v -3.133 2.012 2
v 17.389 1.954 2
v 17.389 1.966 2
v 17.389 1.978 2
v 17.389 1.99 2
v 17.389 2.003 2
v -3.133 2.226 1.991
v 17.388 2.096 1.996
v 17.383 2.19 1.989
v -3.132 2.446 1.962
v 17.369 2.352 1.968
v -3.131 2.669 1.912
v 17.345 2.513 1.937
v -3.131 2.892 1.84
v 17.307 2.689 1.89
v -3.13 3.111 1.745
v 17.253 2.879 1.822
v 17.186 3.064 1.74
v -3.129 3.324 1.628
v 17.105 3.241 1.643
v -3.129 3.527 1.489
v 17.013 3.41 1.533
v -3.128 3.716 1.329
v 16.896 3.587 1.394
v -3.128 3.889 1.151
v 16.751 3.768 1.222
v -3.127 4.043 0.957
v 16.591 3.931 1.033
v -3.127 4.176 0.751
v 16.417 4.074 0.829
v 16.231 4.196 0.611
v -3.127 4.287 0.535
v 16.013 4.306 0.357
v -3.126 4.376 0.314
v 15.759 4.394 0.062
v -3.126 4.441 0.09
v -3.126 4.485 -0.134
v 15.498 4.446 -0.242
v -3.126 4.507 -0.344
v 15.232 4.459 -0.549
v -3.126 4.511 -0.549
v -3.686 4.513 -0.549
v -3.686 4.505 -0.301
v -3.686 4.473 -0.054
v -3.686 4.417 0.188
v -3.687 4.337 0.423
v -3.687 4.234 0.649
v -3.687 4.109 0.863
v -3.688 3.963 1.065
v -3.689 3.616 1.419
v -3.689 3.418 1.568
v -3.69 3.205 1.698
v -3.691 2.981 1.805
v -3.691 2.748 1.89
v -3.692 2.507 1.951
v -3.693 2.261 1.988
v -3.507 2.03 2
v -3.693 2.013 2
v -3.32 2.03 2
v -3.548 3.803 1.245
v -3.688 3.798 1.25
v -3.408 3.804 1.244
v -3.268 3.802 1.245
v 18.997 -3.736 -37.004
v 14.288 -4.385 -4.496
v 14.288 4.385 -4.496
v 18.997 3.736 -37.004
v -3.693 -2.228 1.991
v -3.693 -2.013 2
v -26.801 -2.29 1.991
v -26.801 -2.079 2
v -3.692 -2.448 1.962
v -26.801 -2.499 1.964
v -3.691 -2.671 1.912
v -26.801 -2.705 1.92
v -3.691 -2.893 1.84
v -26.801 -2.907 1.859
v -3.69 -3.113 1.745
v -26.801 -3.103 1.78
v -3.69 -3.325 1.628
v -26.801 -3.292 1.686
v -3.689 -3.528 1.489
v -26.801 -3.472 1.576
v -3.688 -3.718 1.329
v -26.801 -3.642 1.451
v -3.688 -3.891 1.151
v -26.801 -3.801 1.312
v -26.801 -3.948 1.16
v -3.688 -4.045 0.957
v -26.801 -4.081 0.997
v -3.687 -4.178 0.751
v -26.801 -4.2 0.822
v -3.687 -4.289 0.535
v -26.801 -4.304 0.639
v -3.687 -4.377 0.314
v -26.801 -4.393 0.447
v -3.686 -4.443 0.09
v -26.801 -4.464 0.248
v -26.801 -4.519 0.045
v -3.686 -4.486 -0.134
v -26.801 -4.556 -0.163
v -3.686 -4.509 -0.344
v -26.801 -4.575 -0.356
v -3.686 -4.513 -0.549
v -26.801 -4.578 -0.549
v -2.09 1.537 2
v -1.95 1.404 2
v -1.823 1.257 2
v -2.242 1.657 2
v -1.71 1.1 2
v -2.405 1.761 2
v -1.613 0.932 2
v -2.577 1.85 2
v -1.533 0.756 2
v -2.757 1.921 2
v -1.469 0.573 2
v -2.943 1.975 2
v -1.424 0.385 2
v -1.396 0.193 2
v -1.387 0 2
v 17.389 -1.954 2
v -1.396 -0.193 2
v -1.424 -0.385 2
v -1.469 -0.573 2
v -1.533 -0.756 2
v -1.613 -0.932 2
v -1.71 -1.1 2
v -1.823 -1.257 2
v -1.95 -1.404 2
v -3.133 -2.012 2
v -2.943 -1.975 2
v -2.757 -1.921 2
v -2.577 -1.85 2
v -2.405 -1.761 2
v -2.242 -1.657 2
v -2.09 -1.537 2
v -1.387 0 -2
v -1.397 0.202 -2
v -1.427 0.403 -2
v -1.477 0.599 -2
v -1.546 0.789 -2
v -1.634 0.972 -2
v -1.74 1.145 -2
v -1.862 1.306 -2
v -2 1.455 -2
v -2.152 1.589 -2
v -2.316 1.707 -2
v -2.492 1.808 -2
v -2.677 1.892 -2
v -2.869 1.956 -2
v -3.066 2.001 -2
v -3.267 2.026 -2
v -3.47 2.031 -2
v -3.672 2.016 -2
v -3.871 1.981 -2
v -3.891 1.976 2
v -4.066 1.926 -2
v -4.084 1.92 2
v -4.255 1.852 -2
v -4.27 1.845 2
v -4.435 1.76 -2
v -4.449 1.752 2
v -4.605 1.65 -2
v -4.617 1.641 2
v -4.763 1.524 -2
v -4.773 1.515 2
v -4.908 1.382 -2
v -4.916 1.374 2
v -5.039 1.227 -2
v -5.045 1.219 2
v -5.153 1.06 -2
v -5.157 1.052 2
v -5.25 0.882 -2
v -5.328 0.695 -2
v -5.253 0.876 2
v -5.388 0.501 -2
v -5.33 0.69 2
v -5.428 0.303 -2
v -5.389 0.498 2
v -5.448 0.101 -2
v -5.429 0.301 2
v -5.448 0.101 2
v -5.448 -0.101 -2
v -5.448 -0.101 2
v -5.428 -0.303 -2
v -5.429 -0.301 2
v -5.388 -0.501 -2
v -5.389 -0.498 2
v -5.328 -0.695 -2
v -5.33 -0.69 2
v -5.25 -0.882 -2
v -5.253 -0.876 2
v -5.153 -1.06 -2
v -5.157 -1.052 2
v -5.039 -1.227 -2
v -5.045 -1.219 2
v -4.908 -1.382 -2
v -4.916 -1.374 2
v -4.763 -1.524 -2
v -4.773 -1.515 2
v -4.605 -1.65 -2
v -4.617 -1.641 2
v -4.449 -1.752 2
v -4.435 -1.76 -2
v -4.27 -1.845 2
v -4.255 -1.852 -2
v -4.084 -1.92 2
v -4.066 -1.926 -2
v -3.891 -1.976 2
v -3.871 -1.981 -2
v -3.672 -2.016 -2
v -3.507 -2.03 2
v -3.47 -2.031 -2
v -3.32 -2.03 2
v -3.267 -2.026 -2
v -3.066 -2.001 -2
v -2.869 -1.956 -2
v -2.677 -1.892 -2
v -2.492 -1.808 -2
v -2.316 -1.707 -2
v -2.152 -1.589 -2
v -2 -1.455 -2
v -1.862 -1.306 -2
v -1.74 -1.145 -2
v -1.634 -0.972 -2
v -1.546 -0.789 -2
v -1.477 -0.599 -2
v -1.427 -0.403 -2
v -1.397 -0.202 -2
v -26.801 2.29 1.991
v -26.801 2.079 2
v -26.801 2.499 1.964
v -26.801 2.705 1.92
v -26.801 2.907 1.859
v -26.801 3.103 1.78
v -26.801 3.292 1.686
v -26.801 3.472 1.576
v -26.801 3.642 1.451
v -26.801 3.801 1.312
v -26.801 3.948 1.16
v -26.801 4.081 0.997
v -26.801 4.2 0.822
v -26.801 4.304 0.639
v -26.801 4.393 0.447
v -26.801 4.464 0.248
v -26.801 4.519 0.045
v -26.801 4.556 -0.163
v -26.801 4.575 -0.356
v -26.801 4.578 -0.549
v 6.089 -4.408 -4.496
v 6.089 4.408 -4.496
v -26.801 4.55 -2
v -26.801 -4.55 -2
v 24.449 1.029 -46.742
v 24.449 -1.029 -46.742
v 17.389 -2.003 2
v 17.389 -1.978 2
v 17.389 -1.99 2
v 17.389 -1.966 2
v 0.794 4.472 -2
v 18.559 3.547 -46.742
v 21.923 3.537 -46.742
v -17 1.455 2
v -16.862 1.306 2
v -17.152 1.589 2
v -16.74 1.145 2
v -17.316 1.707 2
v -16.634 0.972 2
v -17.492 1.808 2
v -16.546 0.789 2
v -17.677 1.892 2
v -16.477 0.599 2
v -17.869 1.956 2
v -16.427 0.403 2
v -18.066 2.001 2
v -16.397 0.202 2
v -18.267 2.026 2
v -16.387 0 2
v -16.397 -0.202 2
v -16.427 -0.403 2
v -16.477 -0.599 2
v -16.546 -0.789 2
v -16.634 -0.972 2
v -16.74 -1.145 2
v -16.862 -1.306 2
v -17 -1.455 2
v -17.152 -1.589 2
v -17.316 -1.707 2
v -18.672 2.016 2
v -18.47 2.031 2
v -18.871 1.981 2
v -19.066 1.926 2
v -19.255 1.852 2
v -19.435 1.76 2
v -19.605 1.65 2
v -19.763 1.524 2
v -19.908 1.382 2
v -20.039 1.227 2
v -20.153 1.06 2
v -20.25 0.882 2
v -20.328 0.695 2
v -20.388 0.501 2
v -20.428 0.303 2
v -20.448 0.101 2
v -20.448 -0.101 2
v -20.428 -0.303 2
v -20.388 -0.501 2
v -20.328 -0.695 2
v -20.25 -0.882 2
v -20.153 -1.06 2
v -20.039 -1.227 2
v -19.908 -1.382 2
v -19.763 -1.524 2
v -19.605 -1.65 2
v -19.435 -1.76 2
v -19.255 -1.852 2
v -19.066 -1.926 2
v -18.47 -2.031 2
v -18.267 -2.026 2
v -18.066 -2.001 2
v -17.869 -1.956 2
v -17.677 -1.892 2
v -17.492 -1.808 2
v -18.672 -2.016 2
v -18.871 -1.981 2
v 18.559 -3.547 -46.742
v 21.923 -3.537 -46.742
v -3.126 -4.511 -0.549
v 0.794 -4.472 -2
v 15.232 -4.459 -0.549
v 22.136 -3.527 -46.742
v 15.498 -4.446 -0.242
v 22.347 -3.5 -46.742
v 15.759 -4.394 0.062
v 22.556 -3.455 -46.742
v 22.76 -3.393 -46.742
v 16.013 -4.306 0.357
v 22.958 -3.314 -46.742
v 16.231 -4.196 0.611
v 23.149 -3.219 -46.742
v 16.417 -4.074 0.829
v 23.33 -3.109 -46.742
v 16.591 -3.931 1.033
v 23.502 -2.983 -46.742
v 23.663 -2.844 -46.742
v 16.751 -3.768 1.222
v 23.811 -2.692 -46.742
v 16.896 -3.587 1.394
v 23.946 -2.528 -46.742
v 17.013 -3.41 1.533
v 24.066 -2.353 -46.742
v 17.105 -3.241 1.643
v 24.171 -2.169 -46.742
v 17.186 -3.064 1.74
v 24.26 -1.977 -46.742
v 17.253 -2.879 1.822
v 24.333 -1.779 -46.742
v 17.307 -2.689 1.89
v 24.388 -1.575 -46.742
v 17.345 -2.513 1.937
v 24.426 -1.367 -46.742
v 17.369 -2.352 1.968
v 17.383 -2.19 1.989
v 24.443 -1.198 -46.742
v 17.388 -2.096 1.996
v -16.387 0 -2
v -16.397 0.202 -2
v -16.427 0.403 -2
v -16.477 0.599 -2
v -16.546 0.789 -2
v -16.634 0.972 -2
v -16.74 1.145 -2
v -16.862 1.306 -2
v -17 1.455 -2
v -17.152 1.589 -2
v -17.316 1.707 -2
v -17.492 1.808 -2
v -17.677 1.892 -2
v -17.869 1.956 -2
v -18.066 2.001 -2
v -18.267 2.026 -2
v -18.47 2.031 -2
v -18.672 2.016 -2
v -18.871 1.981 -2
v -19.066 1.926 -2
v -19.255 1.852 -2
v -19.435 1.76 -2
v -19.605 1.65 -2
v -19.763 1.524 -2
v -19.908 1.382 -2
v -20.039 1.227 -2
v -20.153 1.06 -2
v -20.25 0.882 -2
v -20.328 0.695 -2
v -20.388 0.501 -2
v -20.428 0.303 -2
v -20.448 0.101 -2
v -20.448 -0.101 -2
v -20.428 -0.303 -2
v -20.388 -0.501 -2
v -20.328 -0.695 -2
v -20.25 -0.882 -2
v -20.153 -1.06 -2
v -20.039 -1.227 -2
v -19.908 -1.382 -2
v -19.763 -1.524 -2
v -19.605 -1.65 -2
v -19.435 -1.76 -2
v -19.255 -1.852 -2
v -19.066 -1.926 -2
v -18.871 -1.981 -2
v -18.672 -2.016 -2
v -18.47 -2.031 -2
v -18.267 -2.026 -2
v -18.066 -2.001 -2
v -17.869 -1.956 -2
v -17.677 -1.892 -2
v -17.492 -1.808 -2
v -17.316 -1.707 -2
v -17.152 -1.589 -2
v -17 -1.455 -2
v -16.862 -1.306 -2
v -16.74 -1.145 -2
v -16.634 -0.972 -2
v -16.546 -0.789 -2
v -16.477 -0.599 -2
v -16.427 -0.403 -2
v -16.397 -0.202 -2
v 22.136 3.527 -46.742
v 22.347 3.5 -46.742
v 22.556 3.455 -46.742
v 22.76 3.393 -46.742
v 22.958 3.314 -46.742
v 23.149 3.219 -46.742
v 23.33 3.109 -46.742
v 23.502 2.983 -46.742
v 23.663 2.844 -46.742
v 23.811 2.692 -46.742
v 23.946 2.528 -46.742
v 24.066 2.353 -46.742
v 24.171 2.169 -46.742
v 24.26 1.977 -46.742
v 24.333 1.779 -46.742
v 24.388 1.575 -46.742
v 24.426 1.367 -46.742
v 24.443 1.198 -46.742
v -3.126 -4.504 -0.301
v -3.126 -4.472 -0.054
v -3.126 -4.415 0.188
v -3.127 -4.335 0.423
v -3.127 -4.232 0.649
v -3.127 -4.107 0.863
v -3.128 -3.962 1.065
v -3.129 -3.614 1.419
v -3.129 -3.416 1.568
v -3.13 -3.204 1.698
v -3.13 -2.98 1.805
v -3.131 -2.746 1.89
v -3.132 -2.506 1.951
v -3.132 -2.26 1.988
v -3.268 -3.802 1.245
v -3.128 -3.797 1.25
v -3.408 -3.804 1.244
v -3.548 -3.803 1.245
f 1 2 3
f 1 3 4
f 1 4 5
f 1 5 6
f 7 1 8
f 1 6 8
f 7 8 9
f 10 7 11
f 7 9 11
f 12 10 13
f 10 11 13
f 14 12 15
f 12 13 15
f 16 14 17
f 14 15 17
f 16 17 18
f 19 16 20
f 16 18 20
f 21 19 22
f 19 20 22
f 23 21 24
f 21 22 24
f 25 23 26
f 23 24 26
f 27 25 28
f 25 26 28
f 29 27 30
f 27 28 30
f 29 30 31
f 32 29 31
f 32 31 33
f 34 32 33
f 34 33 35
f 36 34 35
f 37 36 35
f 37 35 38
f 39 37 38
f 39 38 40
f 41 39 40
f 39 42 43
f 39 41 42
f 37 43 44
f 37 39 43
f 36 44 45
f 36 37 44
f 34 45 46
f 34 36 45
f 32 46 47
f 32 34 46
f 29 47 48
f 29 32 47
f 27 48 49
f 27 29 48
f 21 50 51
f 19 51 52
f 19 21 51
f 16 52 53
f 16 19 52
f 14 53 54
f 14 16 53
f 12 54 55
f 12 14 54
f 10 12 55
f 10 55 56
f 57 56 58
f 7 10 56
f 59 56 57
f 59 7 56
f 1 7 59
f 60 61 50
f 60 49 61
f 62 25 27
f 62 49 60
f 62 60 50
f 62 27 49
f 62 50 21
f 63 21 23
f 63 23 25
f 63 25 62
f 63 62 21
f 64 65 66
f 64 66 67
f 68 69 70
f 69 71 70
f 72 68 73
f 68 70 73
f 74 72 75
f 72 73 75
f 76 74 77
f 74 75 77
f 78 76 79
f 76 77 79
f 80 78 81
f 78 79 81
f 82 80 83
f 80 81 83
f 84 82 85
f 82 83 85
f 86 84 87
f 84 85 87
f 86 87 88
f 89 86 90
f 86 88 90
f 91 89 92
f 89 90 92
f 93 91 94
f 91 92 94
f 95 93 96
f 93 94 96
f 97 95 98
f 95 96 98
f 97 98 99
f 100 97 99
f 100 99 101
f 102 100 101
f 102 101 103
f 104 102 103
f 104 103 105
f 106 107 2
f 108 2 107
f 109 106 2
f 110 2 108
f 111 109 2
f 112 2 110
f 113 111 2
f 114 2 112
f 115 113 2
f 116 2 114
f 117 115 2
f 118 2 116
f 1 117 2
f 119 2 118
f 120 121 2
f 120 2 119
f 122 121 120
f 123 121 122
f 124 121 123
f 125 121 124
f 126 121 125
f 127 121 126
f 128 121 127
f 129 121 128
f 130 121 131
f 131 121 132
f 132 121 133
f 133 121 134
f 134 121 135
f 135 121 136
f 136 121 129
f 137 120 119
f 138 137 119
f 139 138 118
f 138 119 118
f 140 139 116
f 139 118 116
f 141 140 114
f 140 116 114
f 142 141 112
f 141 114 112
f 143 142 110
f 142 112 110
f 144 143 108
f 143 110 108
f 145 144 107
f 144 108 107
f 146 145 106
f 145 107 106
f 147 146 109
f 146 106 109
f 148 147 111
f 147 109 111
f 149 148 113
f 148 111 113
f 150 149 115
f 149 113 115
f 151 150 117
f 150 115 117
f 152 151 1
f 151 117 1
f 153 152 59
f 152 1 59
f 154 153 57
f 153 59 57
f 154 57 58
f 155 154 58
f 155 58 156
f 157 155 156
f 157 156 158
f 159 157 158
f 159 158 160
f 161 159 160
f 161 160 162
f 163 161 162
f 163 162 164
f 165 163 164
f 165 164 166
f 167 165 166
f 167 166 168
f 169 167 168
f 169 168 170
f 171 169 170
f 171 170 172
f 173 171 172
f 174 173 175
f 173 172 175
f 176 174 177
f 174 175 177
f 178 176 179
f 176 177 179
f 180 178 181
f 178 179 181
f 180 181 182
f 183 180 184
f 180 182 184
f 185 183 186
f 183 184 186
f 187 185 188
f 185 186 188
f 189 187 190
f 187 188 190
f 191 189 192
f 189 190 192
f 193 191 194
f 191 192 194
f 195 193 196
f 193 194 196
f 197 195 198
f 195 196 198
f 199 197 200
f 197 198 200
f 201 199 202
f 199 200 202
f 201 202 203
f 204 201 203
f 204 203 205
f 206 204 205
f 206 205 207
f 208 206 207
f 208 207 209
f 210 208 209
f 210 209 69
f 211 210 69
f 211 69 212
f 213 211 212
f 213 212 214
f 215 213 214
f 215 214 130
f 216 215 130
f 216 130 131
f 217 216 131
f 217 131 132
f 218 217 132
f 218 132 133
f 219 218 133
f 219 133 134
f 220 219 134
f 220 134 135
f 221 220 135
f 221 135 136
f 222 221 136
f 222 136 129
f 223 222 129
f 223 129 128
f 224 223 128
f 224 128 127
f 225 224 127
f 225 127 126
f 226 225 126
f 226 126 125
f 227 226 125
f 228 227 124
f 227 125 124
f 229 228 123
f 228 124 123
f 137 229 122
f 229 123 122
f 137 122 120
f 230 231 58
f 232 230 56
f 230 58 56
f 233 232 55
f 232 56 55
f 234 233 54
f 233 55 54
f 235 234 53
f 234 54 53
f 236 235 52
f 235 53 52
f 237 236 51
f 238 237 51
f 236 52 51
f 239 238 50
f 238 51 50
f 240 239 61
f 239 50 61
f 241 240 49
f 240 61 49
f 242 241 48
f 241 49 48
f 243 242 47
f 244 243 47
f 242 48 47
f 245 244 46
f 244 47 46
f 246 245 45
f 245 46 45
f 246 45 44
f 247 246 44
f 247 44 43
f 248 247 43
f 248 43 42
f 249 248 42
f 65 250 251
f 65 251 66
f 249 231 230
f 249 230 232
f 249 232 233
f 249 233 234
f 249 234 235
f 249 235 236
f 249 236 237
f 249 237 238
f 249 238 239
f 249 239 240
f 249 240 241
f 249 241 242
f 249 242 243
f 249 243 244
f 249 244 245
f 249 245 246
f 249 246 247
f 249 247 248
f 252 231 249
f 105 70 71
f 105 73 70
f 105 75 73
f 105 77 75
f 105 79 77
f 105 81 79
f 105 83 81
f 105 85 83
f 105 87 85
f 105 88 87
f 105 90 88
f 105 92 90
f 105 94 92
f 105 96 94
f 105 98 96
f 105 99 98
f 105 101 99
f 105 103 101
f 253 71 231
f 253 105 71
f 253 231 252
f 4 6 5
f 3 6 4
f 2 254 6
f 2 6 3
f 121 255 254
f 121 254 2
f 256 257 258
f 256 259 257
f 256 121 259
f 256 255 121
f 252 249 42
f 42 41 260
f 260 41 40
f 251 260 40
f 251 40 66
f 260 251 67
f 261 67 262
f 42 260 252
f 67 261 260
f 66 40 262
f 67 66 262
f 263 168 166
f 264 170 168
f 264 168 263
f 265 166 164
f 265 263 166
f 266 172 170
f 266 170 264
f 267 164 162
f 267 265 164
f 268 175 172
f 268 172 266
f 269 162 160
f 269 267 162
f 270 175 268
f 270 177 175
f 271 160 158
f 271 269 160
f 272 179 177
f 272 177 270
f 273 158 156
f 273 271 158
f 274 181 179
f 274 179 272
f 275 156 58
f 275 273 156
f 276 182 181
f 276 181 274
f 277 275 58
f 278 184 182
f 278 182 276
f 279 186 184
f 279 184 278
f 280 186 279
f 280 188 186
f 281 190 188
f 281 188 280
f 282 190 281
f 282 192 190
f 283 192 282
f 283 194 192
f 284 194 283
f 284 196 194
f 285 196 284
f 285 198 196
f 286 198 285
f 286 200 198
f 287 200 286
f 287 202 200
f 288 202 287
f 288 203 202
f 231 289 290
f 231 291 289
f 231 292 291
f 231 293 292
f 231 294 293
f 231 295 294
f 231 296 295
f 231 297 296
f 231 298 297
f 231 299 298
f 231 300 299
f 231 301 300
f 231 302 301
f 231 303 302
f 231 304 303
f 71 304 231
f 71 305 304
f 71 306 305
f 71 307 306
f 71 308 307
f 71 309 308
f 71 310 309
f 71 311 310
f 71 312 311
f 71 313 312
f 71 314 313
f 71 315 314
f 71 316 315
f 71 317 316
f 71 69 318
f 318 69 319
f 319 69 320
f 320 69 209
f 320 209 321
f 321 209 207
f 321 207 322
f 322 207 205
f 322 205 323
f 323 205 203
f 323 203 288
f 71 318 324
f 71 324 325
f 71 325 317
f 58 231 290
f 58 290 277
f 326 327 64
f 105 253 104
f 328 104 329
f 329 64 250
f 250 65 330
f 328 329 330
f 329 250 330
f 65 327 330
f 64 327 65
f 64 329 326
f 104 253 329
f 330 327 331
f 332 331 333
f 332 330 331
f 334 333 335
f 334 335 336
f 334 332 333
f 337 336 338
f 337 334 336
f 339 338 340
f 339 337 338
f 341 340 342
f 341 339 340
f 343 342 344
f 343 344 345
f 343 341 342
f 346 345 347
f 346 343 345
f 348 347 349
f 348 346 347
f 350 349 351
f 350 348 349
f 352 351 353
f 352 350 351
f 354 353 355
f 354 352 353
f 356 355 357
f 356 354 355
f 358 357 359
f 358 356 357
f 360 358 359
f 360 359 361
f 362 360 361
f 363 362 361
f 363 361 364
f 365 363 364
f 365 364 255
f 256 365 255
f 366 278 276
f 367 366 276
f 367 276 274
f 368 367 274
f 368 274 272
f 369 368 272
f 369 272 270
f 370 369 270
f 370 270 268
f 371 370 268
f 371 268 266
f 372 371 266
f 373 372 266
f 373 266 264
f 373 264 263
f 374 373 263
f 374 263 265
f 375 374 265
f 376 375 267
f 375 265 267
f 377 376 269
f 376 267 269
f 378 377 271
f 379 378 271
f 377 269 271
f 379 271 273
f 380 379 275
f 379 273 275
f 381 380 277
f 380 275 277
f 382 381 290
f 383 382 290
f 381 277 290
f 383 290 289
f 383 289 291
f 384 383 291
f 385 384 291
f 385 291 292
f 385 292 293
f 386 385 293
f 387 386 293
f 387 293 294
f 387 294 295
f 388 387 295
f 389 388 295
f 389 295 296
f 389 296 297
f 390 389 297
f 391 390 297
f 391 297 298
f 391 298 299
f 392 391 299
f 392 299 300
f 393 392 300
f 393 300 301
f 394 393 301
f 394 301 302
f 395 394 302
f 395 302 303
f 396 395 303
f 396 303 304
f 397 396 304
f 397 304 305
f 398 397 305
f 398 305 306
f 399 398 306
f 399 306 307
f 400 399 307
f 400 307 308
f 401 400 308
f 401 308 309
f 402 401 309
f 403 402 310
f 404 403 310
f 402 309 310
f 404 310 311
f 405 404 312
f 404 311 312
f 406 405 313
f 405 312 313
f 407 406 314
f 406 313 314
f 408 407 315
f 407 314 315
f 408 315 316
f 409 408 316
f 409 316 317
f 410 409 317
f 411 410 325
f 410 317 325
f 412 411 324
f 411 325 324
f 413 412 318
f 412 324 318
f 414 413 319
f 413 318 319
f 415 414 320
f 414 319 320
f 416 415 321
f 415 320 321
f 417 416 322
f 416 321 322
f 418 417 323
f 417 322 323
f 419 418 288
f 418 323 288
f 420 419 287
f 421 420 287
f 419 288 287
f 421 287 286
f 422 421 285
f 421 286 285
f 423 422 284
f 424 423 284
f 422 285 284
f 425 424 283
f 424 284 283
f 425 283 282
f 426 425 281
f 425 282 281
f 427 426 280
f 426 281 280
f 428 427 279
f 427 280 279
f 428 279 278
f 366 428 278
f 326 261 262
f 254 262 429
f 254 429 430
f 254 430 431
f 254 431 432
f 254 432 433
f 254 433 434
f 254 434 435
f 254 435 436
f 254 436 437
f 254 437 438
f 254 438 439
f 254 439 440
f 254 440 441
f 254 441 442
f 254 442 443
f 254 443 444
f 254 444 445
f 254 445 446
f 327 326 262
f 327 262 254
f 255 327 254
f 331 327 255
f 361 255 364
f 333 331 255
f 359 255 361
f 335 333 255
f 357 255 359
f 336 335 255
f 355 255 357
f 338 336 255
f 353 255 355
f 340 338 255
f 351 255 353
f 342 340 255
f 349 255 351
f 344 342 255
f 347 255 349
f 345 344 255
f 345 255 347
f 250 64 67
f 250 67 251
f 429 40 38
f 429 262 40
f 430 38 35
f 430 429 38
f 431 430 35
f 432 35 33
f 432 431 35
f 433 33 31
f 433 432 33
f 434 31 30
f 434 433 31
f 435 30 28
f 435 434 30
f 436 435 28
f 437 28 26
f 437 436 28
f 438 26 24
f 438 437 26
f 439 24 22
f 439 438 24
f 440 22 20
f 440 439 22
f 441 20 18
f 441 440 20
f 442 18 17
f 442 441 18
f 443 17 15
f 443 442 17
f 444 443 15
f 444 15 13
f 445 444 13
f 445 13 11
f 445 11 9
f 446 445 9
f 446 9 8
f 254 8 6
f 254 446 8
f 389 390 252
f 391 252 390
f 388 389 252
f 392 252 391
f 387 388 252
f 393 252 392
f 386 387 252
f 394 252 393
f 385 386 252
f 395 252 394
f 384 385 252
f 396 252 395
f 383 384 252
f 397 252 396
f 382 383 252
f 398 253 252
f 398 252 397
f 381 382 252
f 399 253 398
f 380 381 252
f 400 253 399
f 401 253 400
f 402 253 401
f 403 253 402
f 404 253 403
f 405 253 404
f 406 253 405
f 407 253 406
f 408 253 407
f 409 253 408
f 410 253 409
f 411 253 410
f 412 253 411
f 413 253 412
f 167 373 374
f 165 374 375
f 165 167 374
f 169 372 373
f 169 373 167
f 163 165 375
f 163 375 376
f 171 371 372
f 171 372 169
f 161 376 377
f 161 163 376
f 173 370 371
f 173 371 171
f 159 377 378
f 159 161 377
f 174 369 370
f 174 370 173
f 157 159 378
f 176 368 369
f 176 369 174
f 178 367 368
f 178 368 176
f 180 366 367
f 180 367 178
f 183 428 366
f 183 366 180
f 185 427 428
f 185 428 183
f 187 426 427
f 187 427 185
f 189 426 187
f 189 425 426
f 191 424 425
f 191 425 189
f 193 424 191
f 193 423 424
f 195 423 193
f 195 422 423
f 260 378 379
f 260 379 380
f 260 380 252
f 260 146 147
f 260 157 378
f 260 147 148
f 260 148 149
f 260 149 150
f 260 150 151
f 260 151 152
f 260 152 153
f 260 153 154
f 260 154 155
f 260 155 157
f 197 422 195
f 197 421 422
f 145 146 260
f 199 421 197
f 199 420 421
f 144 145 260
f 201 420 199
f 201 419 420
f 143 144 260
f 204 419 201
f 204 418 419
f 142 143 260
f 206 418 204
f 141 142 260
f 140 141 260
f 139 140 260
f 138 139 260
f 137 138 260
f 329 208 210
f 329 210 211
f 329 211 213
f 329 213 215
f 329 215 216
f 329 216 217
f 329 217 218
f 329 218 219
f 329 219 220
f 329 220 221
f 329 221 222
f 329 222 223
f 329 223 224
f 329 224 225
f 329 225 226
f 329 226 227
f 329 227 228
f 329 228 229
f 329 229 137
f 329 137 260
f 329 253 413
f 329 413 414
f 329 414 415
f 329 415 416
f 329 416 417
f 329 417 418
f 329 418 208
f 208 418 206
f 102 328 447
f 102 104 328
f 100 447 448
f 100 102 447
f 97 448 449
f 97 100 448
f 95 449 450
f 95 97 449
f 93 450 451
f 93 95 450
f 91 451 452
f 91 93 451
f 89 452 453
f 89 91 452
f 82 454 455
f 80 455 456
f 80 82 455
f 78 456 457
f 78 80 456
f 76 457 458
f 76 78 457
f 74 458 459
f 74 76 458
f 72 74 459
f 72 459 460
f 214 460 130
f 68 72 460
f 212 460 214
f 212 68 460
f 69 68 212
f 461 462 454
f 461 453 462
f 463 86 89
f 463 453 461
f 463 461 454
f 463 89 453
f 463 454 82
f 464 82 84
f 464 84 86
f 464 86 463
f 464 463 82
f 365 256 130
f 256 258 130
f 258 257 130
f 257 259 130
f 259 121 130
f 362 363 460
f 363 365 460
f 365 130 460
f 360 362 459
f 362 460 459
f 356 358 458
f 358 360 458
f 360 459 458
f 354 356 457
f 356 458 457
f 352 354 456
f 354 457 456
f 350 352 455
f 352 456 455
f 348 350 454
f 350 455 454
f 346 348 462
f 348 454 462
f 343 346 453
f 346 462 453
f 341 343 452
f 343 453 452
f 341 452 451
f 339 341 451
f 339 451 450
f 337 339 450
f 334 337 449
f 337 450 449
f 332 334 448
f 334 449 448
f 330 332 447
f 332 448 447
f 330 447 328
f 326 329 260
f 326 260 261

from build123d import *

# Parameters (mm, degrees)
F1_DEPTH      = 11.5
F1_DEPTH_BACK = 7.25
F4_DEPTH      = 57.75
F5_R          = 2.032
F6_DEPTH      = 25
F7_R          = 2.5


# Not quite as in the source:
# - a feature names something its author has since deleted; it is built from what else it names


with BuildPart() as f1:
    # F0 (on Front) → F1 (new body, two sides)
    with BuildSketch(Plane.XZ) as f1_sk:
        Polygon((-26.8014297359, 2.0000000475), (-26.8014297359, -2.0000000475), (0.7941166829, -2.0000000475), (18.5593261492, -46.7420644607), (24.4487996128, -46.7420644607), (17.3888709152, 2.0000000475), align=None)
        Polygon((18.9966002603, -37.0041966029), (6.0891124744, -4.4964093445), (14.2880869367, -4.4964093445), align=None, mode=Mode.SUBTRACT)
    extrude(amount=F1_DEPTH)
    extrude(f1_sk.sketch, amount=-F1_DEPTH_BACK)

    # F3 (on offset) → F4 (cut)
    with BuildSketch(Plane(origin=(18.7998007554, 0, 2.7230125396), x_dir=(0, 1, 0), z_dir=(0.9896725236, 0, 0.1433467688))):
        Polygon((-18.5980091819, 10.2755831857), (-17.1822748397, -51.6943840463), (-3.4891957167, -51.8214939905), (-4.7216577223, 10.5497811385), align=None)
        Polygon((3.4891957167, -51.8214939905), (17.1822748397, -51.6943840463), (18.5980091819, 10.2755831857), (4.7216577223, 10.5497811385), align=None)
    extrude(amount=-F4_DEPTH, mode=Mode.SUBTRACT)

    # F5 (on face) → F6 (cut)
    with BuildSketch(Plane.XY.offset(2.0000000475)):
        with Locations((-3.4189070485, 0)):
            Circle(F5_R)
        with Locations((-18.4189070485, 0)):
            Circle(F5_R)
    extrude(amount=-F6_DEPTH, mode=Mode.SUBTRACT)

    # F7
    f7_edges = [f1.edges().sort_by_distance(p)[0] for p in [
        (-4.706279, -4.565636, 2),
        (-4.706279, 4.565636, 2),
        (20.918835, 4.016451, -22.371032),
        (20.918835, -4.016451, -22.371032),
    ]]
    fillet(f7_edges, radius=F7_R)


solid = f1.part
